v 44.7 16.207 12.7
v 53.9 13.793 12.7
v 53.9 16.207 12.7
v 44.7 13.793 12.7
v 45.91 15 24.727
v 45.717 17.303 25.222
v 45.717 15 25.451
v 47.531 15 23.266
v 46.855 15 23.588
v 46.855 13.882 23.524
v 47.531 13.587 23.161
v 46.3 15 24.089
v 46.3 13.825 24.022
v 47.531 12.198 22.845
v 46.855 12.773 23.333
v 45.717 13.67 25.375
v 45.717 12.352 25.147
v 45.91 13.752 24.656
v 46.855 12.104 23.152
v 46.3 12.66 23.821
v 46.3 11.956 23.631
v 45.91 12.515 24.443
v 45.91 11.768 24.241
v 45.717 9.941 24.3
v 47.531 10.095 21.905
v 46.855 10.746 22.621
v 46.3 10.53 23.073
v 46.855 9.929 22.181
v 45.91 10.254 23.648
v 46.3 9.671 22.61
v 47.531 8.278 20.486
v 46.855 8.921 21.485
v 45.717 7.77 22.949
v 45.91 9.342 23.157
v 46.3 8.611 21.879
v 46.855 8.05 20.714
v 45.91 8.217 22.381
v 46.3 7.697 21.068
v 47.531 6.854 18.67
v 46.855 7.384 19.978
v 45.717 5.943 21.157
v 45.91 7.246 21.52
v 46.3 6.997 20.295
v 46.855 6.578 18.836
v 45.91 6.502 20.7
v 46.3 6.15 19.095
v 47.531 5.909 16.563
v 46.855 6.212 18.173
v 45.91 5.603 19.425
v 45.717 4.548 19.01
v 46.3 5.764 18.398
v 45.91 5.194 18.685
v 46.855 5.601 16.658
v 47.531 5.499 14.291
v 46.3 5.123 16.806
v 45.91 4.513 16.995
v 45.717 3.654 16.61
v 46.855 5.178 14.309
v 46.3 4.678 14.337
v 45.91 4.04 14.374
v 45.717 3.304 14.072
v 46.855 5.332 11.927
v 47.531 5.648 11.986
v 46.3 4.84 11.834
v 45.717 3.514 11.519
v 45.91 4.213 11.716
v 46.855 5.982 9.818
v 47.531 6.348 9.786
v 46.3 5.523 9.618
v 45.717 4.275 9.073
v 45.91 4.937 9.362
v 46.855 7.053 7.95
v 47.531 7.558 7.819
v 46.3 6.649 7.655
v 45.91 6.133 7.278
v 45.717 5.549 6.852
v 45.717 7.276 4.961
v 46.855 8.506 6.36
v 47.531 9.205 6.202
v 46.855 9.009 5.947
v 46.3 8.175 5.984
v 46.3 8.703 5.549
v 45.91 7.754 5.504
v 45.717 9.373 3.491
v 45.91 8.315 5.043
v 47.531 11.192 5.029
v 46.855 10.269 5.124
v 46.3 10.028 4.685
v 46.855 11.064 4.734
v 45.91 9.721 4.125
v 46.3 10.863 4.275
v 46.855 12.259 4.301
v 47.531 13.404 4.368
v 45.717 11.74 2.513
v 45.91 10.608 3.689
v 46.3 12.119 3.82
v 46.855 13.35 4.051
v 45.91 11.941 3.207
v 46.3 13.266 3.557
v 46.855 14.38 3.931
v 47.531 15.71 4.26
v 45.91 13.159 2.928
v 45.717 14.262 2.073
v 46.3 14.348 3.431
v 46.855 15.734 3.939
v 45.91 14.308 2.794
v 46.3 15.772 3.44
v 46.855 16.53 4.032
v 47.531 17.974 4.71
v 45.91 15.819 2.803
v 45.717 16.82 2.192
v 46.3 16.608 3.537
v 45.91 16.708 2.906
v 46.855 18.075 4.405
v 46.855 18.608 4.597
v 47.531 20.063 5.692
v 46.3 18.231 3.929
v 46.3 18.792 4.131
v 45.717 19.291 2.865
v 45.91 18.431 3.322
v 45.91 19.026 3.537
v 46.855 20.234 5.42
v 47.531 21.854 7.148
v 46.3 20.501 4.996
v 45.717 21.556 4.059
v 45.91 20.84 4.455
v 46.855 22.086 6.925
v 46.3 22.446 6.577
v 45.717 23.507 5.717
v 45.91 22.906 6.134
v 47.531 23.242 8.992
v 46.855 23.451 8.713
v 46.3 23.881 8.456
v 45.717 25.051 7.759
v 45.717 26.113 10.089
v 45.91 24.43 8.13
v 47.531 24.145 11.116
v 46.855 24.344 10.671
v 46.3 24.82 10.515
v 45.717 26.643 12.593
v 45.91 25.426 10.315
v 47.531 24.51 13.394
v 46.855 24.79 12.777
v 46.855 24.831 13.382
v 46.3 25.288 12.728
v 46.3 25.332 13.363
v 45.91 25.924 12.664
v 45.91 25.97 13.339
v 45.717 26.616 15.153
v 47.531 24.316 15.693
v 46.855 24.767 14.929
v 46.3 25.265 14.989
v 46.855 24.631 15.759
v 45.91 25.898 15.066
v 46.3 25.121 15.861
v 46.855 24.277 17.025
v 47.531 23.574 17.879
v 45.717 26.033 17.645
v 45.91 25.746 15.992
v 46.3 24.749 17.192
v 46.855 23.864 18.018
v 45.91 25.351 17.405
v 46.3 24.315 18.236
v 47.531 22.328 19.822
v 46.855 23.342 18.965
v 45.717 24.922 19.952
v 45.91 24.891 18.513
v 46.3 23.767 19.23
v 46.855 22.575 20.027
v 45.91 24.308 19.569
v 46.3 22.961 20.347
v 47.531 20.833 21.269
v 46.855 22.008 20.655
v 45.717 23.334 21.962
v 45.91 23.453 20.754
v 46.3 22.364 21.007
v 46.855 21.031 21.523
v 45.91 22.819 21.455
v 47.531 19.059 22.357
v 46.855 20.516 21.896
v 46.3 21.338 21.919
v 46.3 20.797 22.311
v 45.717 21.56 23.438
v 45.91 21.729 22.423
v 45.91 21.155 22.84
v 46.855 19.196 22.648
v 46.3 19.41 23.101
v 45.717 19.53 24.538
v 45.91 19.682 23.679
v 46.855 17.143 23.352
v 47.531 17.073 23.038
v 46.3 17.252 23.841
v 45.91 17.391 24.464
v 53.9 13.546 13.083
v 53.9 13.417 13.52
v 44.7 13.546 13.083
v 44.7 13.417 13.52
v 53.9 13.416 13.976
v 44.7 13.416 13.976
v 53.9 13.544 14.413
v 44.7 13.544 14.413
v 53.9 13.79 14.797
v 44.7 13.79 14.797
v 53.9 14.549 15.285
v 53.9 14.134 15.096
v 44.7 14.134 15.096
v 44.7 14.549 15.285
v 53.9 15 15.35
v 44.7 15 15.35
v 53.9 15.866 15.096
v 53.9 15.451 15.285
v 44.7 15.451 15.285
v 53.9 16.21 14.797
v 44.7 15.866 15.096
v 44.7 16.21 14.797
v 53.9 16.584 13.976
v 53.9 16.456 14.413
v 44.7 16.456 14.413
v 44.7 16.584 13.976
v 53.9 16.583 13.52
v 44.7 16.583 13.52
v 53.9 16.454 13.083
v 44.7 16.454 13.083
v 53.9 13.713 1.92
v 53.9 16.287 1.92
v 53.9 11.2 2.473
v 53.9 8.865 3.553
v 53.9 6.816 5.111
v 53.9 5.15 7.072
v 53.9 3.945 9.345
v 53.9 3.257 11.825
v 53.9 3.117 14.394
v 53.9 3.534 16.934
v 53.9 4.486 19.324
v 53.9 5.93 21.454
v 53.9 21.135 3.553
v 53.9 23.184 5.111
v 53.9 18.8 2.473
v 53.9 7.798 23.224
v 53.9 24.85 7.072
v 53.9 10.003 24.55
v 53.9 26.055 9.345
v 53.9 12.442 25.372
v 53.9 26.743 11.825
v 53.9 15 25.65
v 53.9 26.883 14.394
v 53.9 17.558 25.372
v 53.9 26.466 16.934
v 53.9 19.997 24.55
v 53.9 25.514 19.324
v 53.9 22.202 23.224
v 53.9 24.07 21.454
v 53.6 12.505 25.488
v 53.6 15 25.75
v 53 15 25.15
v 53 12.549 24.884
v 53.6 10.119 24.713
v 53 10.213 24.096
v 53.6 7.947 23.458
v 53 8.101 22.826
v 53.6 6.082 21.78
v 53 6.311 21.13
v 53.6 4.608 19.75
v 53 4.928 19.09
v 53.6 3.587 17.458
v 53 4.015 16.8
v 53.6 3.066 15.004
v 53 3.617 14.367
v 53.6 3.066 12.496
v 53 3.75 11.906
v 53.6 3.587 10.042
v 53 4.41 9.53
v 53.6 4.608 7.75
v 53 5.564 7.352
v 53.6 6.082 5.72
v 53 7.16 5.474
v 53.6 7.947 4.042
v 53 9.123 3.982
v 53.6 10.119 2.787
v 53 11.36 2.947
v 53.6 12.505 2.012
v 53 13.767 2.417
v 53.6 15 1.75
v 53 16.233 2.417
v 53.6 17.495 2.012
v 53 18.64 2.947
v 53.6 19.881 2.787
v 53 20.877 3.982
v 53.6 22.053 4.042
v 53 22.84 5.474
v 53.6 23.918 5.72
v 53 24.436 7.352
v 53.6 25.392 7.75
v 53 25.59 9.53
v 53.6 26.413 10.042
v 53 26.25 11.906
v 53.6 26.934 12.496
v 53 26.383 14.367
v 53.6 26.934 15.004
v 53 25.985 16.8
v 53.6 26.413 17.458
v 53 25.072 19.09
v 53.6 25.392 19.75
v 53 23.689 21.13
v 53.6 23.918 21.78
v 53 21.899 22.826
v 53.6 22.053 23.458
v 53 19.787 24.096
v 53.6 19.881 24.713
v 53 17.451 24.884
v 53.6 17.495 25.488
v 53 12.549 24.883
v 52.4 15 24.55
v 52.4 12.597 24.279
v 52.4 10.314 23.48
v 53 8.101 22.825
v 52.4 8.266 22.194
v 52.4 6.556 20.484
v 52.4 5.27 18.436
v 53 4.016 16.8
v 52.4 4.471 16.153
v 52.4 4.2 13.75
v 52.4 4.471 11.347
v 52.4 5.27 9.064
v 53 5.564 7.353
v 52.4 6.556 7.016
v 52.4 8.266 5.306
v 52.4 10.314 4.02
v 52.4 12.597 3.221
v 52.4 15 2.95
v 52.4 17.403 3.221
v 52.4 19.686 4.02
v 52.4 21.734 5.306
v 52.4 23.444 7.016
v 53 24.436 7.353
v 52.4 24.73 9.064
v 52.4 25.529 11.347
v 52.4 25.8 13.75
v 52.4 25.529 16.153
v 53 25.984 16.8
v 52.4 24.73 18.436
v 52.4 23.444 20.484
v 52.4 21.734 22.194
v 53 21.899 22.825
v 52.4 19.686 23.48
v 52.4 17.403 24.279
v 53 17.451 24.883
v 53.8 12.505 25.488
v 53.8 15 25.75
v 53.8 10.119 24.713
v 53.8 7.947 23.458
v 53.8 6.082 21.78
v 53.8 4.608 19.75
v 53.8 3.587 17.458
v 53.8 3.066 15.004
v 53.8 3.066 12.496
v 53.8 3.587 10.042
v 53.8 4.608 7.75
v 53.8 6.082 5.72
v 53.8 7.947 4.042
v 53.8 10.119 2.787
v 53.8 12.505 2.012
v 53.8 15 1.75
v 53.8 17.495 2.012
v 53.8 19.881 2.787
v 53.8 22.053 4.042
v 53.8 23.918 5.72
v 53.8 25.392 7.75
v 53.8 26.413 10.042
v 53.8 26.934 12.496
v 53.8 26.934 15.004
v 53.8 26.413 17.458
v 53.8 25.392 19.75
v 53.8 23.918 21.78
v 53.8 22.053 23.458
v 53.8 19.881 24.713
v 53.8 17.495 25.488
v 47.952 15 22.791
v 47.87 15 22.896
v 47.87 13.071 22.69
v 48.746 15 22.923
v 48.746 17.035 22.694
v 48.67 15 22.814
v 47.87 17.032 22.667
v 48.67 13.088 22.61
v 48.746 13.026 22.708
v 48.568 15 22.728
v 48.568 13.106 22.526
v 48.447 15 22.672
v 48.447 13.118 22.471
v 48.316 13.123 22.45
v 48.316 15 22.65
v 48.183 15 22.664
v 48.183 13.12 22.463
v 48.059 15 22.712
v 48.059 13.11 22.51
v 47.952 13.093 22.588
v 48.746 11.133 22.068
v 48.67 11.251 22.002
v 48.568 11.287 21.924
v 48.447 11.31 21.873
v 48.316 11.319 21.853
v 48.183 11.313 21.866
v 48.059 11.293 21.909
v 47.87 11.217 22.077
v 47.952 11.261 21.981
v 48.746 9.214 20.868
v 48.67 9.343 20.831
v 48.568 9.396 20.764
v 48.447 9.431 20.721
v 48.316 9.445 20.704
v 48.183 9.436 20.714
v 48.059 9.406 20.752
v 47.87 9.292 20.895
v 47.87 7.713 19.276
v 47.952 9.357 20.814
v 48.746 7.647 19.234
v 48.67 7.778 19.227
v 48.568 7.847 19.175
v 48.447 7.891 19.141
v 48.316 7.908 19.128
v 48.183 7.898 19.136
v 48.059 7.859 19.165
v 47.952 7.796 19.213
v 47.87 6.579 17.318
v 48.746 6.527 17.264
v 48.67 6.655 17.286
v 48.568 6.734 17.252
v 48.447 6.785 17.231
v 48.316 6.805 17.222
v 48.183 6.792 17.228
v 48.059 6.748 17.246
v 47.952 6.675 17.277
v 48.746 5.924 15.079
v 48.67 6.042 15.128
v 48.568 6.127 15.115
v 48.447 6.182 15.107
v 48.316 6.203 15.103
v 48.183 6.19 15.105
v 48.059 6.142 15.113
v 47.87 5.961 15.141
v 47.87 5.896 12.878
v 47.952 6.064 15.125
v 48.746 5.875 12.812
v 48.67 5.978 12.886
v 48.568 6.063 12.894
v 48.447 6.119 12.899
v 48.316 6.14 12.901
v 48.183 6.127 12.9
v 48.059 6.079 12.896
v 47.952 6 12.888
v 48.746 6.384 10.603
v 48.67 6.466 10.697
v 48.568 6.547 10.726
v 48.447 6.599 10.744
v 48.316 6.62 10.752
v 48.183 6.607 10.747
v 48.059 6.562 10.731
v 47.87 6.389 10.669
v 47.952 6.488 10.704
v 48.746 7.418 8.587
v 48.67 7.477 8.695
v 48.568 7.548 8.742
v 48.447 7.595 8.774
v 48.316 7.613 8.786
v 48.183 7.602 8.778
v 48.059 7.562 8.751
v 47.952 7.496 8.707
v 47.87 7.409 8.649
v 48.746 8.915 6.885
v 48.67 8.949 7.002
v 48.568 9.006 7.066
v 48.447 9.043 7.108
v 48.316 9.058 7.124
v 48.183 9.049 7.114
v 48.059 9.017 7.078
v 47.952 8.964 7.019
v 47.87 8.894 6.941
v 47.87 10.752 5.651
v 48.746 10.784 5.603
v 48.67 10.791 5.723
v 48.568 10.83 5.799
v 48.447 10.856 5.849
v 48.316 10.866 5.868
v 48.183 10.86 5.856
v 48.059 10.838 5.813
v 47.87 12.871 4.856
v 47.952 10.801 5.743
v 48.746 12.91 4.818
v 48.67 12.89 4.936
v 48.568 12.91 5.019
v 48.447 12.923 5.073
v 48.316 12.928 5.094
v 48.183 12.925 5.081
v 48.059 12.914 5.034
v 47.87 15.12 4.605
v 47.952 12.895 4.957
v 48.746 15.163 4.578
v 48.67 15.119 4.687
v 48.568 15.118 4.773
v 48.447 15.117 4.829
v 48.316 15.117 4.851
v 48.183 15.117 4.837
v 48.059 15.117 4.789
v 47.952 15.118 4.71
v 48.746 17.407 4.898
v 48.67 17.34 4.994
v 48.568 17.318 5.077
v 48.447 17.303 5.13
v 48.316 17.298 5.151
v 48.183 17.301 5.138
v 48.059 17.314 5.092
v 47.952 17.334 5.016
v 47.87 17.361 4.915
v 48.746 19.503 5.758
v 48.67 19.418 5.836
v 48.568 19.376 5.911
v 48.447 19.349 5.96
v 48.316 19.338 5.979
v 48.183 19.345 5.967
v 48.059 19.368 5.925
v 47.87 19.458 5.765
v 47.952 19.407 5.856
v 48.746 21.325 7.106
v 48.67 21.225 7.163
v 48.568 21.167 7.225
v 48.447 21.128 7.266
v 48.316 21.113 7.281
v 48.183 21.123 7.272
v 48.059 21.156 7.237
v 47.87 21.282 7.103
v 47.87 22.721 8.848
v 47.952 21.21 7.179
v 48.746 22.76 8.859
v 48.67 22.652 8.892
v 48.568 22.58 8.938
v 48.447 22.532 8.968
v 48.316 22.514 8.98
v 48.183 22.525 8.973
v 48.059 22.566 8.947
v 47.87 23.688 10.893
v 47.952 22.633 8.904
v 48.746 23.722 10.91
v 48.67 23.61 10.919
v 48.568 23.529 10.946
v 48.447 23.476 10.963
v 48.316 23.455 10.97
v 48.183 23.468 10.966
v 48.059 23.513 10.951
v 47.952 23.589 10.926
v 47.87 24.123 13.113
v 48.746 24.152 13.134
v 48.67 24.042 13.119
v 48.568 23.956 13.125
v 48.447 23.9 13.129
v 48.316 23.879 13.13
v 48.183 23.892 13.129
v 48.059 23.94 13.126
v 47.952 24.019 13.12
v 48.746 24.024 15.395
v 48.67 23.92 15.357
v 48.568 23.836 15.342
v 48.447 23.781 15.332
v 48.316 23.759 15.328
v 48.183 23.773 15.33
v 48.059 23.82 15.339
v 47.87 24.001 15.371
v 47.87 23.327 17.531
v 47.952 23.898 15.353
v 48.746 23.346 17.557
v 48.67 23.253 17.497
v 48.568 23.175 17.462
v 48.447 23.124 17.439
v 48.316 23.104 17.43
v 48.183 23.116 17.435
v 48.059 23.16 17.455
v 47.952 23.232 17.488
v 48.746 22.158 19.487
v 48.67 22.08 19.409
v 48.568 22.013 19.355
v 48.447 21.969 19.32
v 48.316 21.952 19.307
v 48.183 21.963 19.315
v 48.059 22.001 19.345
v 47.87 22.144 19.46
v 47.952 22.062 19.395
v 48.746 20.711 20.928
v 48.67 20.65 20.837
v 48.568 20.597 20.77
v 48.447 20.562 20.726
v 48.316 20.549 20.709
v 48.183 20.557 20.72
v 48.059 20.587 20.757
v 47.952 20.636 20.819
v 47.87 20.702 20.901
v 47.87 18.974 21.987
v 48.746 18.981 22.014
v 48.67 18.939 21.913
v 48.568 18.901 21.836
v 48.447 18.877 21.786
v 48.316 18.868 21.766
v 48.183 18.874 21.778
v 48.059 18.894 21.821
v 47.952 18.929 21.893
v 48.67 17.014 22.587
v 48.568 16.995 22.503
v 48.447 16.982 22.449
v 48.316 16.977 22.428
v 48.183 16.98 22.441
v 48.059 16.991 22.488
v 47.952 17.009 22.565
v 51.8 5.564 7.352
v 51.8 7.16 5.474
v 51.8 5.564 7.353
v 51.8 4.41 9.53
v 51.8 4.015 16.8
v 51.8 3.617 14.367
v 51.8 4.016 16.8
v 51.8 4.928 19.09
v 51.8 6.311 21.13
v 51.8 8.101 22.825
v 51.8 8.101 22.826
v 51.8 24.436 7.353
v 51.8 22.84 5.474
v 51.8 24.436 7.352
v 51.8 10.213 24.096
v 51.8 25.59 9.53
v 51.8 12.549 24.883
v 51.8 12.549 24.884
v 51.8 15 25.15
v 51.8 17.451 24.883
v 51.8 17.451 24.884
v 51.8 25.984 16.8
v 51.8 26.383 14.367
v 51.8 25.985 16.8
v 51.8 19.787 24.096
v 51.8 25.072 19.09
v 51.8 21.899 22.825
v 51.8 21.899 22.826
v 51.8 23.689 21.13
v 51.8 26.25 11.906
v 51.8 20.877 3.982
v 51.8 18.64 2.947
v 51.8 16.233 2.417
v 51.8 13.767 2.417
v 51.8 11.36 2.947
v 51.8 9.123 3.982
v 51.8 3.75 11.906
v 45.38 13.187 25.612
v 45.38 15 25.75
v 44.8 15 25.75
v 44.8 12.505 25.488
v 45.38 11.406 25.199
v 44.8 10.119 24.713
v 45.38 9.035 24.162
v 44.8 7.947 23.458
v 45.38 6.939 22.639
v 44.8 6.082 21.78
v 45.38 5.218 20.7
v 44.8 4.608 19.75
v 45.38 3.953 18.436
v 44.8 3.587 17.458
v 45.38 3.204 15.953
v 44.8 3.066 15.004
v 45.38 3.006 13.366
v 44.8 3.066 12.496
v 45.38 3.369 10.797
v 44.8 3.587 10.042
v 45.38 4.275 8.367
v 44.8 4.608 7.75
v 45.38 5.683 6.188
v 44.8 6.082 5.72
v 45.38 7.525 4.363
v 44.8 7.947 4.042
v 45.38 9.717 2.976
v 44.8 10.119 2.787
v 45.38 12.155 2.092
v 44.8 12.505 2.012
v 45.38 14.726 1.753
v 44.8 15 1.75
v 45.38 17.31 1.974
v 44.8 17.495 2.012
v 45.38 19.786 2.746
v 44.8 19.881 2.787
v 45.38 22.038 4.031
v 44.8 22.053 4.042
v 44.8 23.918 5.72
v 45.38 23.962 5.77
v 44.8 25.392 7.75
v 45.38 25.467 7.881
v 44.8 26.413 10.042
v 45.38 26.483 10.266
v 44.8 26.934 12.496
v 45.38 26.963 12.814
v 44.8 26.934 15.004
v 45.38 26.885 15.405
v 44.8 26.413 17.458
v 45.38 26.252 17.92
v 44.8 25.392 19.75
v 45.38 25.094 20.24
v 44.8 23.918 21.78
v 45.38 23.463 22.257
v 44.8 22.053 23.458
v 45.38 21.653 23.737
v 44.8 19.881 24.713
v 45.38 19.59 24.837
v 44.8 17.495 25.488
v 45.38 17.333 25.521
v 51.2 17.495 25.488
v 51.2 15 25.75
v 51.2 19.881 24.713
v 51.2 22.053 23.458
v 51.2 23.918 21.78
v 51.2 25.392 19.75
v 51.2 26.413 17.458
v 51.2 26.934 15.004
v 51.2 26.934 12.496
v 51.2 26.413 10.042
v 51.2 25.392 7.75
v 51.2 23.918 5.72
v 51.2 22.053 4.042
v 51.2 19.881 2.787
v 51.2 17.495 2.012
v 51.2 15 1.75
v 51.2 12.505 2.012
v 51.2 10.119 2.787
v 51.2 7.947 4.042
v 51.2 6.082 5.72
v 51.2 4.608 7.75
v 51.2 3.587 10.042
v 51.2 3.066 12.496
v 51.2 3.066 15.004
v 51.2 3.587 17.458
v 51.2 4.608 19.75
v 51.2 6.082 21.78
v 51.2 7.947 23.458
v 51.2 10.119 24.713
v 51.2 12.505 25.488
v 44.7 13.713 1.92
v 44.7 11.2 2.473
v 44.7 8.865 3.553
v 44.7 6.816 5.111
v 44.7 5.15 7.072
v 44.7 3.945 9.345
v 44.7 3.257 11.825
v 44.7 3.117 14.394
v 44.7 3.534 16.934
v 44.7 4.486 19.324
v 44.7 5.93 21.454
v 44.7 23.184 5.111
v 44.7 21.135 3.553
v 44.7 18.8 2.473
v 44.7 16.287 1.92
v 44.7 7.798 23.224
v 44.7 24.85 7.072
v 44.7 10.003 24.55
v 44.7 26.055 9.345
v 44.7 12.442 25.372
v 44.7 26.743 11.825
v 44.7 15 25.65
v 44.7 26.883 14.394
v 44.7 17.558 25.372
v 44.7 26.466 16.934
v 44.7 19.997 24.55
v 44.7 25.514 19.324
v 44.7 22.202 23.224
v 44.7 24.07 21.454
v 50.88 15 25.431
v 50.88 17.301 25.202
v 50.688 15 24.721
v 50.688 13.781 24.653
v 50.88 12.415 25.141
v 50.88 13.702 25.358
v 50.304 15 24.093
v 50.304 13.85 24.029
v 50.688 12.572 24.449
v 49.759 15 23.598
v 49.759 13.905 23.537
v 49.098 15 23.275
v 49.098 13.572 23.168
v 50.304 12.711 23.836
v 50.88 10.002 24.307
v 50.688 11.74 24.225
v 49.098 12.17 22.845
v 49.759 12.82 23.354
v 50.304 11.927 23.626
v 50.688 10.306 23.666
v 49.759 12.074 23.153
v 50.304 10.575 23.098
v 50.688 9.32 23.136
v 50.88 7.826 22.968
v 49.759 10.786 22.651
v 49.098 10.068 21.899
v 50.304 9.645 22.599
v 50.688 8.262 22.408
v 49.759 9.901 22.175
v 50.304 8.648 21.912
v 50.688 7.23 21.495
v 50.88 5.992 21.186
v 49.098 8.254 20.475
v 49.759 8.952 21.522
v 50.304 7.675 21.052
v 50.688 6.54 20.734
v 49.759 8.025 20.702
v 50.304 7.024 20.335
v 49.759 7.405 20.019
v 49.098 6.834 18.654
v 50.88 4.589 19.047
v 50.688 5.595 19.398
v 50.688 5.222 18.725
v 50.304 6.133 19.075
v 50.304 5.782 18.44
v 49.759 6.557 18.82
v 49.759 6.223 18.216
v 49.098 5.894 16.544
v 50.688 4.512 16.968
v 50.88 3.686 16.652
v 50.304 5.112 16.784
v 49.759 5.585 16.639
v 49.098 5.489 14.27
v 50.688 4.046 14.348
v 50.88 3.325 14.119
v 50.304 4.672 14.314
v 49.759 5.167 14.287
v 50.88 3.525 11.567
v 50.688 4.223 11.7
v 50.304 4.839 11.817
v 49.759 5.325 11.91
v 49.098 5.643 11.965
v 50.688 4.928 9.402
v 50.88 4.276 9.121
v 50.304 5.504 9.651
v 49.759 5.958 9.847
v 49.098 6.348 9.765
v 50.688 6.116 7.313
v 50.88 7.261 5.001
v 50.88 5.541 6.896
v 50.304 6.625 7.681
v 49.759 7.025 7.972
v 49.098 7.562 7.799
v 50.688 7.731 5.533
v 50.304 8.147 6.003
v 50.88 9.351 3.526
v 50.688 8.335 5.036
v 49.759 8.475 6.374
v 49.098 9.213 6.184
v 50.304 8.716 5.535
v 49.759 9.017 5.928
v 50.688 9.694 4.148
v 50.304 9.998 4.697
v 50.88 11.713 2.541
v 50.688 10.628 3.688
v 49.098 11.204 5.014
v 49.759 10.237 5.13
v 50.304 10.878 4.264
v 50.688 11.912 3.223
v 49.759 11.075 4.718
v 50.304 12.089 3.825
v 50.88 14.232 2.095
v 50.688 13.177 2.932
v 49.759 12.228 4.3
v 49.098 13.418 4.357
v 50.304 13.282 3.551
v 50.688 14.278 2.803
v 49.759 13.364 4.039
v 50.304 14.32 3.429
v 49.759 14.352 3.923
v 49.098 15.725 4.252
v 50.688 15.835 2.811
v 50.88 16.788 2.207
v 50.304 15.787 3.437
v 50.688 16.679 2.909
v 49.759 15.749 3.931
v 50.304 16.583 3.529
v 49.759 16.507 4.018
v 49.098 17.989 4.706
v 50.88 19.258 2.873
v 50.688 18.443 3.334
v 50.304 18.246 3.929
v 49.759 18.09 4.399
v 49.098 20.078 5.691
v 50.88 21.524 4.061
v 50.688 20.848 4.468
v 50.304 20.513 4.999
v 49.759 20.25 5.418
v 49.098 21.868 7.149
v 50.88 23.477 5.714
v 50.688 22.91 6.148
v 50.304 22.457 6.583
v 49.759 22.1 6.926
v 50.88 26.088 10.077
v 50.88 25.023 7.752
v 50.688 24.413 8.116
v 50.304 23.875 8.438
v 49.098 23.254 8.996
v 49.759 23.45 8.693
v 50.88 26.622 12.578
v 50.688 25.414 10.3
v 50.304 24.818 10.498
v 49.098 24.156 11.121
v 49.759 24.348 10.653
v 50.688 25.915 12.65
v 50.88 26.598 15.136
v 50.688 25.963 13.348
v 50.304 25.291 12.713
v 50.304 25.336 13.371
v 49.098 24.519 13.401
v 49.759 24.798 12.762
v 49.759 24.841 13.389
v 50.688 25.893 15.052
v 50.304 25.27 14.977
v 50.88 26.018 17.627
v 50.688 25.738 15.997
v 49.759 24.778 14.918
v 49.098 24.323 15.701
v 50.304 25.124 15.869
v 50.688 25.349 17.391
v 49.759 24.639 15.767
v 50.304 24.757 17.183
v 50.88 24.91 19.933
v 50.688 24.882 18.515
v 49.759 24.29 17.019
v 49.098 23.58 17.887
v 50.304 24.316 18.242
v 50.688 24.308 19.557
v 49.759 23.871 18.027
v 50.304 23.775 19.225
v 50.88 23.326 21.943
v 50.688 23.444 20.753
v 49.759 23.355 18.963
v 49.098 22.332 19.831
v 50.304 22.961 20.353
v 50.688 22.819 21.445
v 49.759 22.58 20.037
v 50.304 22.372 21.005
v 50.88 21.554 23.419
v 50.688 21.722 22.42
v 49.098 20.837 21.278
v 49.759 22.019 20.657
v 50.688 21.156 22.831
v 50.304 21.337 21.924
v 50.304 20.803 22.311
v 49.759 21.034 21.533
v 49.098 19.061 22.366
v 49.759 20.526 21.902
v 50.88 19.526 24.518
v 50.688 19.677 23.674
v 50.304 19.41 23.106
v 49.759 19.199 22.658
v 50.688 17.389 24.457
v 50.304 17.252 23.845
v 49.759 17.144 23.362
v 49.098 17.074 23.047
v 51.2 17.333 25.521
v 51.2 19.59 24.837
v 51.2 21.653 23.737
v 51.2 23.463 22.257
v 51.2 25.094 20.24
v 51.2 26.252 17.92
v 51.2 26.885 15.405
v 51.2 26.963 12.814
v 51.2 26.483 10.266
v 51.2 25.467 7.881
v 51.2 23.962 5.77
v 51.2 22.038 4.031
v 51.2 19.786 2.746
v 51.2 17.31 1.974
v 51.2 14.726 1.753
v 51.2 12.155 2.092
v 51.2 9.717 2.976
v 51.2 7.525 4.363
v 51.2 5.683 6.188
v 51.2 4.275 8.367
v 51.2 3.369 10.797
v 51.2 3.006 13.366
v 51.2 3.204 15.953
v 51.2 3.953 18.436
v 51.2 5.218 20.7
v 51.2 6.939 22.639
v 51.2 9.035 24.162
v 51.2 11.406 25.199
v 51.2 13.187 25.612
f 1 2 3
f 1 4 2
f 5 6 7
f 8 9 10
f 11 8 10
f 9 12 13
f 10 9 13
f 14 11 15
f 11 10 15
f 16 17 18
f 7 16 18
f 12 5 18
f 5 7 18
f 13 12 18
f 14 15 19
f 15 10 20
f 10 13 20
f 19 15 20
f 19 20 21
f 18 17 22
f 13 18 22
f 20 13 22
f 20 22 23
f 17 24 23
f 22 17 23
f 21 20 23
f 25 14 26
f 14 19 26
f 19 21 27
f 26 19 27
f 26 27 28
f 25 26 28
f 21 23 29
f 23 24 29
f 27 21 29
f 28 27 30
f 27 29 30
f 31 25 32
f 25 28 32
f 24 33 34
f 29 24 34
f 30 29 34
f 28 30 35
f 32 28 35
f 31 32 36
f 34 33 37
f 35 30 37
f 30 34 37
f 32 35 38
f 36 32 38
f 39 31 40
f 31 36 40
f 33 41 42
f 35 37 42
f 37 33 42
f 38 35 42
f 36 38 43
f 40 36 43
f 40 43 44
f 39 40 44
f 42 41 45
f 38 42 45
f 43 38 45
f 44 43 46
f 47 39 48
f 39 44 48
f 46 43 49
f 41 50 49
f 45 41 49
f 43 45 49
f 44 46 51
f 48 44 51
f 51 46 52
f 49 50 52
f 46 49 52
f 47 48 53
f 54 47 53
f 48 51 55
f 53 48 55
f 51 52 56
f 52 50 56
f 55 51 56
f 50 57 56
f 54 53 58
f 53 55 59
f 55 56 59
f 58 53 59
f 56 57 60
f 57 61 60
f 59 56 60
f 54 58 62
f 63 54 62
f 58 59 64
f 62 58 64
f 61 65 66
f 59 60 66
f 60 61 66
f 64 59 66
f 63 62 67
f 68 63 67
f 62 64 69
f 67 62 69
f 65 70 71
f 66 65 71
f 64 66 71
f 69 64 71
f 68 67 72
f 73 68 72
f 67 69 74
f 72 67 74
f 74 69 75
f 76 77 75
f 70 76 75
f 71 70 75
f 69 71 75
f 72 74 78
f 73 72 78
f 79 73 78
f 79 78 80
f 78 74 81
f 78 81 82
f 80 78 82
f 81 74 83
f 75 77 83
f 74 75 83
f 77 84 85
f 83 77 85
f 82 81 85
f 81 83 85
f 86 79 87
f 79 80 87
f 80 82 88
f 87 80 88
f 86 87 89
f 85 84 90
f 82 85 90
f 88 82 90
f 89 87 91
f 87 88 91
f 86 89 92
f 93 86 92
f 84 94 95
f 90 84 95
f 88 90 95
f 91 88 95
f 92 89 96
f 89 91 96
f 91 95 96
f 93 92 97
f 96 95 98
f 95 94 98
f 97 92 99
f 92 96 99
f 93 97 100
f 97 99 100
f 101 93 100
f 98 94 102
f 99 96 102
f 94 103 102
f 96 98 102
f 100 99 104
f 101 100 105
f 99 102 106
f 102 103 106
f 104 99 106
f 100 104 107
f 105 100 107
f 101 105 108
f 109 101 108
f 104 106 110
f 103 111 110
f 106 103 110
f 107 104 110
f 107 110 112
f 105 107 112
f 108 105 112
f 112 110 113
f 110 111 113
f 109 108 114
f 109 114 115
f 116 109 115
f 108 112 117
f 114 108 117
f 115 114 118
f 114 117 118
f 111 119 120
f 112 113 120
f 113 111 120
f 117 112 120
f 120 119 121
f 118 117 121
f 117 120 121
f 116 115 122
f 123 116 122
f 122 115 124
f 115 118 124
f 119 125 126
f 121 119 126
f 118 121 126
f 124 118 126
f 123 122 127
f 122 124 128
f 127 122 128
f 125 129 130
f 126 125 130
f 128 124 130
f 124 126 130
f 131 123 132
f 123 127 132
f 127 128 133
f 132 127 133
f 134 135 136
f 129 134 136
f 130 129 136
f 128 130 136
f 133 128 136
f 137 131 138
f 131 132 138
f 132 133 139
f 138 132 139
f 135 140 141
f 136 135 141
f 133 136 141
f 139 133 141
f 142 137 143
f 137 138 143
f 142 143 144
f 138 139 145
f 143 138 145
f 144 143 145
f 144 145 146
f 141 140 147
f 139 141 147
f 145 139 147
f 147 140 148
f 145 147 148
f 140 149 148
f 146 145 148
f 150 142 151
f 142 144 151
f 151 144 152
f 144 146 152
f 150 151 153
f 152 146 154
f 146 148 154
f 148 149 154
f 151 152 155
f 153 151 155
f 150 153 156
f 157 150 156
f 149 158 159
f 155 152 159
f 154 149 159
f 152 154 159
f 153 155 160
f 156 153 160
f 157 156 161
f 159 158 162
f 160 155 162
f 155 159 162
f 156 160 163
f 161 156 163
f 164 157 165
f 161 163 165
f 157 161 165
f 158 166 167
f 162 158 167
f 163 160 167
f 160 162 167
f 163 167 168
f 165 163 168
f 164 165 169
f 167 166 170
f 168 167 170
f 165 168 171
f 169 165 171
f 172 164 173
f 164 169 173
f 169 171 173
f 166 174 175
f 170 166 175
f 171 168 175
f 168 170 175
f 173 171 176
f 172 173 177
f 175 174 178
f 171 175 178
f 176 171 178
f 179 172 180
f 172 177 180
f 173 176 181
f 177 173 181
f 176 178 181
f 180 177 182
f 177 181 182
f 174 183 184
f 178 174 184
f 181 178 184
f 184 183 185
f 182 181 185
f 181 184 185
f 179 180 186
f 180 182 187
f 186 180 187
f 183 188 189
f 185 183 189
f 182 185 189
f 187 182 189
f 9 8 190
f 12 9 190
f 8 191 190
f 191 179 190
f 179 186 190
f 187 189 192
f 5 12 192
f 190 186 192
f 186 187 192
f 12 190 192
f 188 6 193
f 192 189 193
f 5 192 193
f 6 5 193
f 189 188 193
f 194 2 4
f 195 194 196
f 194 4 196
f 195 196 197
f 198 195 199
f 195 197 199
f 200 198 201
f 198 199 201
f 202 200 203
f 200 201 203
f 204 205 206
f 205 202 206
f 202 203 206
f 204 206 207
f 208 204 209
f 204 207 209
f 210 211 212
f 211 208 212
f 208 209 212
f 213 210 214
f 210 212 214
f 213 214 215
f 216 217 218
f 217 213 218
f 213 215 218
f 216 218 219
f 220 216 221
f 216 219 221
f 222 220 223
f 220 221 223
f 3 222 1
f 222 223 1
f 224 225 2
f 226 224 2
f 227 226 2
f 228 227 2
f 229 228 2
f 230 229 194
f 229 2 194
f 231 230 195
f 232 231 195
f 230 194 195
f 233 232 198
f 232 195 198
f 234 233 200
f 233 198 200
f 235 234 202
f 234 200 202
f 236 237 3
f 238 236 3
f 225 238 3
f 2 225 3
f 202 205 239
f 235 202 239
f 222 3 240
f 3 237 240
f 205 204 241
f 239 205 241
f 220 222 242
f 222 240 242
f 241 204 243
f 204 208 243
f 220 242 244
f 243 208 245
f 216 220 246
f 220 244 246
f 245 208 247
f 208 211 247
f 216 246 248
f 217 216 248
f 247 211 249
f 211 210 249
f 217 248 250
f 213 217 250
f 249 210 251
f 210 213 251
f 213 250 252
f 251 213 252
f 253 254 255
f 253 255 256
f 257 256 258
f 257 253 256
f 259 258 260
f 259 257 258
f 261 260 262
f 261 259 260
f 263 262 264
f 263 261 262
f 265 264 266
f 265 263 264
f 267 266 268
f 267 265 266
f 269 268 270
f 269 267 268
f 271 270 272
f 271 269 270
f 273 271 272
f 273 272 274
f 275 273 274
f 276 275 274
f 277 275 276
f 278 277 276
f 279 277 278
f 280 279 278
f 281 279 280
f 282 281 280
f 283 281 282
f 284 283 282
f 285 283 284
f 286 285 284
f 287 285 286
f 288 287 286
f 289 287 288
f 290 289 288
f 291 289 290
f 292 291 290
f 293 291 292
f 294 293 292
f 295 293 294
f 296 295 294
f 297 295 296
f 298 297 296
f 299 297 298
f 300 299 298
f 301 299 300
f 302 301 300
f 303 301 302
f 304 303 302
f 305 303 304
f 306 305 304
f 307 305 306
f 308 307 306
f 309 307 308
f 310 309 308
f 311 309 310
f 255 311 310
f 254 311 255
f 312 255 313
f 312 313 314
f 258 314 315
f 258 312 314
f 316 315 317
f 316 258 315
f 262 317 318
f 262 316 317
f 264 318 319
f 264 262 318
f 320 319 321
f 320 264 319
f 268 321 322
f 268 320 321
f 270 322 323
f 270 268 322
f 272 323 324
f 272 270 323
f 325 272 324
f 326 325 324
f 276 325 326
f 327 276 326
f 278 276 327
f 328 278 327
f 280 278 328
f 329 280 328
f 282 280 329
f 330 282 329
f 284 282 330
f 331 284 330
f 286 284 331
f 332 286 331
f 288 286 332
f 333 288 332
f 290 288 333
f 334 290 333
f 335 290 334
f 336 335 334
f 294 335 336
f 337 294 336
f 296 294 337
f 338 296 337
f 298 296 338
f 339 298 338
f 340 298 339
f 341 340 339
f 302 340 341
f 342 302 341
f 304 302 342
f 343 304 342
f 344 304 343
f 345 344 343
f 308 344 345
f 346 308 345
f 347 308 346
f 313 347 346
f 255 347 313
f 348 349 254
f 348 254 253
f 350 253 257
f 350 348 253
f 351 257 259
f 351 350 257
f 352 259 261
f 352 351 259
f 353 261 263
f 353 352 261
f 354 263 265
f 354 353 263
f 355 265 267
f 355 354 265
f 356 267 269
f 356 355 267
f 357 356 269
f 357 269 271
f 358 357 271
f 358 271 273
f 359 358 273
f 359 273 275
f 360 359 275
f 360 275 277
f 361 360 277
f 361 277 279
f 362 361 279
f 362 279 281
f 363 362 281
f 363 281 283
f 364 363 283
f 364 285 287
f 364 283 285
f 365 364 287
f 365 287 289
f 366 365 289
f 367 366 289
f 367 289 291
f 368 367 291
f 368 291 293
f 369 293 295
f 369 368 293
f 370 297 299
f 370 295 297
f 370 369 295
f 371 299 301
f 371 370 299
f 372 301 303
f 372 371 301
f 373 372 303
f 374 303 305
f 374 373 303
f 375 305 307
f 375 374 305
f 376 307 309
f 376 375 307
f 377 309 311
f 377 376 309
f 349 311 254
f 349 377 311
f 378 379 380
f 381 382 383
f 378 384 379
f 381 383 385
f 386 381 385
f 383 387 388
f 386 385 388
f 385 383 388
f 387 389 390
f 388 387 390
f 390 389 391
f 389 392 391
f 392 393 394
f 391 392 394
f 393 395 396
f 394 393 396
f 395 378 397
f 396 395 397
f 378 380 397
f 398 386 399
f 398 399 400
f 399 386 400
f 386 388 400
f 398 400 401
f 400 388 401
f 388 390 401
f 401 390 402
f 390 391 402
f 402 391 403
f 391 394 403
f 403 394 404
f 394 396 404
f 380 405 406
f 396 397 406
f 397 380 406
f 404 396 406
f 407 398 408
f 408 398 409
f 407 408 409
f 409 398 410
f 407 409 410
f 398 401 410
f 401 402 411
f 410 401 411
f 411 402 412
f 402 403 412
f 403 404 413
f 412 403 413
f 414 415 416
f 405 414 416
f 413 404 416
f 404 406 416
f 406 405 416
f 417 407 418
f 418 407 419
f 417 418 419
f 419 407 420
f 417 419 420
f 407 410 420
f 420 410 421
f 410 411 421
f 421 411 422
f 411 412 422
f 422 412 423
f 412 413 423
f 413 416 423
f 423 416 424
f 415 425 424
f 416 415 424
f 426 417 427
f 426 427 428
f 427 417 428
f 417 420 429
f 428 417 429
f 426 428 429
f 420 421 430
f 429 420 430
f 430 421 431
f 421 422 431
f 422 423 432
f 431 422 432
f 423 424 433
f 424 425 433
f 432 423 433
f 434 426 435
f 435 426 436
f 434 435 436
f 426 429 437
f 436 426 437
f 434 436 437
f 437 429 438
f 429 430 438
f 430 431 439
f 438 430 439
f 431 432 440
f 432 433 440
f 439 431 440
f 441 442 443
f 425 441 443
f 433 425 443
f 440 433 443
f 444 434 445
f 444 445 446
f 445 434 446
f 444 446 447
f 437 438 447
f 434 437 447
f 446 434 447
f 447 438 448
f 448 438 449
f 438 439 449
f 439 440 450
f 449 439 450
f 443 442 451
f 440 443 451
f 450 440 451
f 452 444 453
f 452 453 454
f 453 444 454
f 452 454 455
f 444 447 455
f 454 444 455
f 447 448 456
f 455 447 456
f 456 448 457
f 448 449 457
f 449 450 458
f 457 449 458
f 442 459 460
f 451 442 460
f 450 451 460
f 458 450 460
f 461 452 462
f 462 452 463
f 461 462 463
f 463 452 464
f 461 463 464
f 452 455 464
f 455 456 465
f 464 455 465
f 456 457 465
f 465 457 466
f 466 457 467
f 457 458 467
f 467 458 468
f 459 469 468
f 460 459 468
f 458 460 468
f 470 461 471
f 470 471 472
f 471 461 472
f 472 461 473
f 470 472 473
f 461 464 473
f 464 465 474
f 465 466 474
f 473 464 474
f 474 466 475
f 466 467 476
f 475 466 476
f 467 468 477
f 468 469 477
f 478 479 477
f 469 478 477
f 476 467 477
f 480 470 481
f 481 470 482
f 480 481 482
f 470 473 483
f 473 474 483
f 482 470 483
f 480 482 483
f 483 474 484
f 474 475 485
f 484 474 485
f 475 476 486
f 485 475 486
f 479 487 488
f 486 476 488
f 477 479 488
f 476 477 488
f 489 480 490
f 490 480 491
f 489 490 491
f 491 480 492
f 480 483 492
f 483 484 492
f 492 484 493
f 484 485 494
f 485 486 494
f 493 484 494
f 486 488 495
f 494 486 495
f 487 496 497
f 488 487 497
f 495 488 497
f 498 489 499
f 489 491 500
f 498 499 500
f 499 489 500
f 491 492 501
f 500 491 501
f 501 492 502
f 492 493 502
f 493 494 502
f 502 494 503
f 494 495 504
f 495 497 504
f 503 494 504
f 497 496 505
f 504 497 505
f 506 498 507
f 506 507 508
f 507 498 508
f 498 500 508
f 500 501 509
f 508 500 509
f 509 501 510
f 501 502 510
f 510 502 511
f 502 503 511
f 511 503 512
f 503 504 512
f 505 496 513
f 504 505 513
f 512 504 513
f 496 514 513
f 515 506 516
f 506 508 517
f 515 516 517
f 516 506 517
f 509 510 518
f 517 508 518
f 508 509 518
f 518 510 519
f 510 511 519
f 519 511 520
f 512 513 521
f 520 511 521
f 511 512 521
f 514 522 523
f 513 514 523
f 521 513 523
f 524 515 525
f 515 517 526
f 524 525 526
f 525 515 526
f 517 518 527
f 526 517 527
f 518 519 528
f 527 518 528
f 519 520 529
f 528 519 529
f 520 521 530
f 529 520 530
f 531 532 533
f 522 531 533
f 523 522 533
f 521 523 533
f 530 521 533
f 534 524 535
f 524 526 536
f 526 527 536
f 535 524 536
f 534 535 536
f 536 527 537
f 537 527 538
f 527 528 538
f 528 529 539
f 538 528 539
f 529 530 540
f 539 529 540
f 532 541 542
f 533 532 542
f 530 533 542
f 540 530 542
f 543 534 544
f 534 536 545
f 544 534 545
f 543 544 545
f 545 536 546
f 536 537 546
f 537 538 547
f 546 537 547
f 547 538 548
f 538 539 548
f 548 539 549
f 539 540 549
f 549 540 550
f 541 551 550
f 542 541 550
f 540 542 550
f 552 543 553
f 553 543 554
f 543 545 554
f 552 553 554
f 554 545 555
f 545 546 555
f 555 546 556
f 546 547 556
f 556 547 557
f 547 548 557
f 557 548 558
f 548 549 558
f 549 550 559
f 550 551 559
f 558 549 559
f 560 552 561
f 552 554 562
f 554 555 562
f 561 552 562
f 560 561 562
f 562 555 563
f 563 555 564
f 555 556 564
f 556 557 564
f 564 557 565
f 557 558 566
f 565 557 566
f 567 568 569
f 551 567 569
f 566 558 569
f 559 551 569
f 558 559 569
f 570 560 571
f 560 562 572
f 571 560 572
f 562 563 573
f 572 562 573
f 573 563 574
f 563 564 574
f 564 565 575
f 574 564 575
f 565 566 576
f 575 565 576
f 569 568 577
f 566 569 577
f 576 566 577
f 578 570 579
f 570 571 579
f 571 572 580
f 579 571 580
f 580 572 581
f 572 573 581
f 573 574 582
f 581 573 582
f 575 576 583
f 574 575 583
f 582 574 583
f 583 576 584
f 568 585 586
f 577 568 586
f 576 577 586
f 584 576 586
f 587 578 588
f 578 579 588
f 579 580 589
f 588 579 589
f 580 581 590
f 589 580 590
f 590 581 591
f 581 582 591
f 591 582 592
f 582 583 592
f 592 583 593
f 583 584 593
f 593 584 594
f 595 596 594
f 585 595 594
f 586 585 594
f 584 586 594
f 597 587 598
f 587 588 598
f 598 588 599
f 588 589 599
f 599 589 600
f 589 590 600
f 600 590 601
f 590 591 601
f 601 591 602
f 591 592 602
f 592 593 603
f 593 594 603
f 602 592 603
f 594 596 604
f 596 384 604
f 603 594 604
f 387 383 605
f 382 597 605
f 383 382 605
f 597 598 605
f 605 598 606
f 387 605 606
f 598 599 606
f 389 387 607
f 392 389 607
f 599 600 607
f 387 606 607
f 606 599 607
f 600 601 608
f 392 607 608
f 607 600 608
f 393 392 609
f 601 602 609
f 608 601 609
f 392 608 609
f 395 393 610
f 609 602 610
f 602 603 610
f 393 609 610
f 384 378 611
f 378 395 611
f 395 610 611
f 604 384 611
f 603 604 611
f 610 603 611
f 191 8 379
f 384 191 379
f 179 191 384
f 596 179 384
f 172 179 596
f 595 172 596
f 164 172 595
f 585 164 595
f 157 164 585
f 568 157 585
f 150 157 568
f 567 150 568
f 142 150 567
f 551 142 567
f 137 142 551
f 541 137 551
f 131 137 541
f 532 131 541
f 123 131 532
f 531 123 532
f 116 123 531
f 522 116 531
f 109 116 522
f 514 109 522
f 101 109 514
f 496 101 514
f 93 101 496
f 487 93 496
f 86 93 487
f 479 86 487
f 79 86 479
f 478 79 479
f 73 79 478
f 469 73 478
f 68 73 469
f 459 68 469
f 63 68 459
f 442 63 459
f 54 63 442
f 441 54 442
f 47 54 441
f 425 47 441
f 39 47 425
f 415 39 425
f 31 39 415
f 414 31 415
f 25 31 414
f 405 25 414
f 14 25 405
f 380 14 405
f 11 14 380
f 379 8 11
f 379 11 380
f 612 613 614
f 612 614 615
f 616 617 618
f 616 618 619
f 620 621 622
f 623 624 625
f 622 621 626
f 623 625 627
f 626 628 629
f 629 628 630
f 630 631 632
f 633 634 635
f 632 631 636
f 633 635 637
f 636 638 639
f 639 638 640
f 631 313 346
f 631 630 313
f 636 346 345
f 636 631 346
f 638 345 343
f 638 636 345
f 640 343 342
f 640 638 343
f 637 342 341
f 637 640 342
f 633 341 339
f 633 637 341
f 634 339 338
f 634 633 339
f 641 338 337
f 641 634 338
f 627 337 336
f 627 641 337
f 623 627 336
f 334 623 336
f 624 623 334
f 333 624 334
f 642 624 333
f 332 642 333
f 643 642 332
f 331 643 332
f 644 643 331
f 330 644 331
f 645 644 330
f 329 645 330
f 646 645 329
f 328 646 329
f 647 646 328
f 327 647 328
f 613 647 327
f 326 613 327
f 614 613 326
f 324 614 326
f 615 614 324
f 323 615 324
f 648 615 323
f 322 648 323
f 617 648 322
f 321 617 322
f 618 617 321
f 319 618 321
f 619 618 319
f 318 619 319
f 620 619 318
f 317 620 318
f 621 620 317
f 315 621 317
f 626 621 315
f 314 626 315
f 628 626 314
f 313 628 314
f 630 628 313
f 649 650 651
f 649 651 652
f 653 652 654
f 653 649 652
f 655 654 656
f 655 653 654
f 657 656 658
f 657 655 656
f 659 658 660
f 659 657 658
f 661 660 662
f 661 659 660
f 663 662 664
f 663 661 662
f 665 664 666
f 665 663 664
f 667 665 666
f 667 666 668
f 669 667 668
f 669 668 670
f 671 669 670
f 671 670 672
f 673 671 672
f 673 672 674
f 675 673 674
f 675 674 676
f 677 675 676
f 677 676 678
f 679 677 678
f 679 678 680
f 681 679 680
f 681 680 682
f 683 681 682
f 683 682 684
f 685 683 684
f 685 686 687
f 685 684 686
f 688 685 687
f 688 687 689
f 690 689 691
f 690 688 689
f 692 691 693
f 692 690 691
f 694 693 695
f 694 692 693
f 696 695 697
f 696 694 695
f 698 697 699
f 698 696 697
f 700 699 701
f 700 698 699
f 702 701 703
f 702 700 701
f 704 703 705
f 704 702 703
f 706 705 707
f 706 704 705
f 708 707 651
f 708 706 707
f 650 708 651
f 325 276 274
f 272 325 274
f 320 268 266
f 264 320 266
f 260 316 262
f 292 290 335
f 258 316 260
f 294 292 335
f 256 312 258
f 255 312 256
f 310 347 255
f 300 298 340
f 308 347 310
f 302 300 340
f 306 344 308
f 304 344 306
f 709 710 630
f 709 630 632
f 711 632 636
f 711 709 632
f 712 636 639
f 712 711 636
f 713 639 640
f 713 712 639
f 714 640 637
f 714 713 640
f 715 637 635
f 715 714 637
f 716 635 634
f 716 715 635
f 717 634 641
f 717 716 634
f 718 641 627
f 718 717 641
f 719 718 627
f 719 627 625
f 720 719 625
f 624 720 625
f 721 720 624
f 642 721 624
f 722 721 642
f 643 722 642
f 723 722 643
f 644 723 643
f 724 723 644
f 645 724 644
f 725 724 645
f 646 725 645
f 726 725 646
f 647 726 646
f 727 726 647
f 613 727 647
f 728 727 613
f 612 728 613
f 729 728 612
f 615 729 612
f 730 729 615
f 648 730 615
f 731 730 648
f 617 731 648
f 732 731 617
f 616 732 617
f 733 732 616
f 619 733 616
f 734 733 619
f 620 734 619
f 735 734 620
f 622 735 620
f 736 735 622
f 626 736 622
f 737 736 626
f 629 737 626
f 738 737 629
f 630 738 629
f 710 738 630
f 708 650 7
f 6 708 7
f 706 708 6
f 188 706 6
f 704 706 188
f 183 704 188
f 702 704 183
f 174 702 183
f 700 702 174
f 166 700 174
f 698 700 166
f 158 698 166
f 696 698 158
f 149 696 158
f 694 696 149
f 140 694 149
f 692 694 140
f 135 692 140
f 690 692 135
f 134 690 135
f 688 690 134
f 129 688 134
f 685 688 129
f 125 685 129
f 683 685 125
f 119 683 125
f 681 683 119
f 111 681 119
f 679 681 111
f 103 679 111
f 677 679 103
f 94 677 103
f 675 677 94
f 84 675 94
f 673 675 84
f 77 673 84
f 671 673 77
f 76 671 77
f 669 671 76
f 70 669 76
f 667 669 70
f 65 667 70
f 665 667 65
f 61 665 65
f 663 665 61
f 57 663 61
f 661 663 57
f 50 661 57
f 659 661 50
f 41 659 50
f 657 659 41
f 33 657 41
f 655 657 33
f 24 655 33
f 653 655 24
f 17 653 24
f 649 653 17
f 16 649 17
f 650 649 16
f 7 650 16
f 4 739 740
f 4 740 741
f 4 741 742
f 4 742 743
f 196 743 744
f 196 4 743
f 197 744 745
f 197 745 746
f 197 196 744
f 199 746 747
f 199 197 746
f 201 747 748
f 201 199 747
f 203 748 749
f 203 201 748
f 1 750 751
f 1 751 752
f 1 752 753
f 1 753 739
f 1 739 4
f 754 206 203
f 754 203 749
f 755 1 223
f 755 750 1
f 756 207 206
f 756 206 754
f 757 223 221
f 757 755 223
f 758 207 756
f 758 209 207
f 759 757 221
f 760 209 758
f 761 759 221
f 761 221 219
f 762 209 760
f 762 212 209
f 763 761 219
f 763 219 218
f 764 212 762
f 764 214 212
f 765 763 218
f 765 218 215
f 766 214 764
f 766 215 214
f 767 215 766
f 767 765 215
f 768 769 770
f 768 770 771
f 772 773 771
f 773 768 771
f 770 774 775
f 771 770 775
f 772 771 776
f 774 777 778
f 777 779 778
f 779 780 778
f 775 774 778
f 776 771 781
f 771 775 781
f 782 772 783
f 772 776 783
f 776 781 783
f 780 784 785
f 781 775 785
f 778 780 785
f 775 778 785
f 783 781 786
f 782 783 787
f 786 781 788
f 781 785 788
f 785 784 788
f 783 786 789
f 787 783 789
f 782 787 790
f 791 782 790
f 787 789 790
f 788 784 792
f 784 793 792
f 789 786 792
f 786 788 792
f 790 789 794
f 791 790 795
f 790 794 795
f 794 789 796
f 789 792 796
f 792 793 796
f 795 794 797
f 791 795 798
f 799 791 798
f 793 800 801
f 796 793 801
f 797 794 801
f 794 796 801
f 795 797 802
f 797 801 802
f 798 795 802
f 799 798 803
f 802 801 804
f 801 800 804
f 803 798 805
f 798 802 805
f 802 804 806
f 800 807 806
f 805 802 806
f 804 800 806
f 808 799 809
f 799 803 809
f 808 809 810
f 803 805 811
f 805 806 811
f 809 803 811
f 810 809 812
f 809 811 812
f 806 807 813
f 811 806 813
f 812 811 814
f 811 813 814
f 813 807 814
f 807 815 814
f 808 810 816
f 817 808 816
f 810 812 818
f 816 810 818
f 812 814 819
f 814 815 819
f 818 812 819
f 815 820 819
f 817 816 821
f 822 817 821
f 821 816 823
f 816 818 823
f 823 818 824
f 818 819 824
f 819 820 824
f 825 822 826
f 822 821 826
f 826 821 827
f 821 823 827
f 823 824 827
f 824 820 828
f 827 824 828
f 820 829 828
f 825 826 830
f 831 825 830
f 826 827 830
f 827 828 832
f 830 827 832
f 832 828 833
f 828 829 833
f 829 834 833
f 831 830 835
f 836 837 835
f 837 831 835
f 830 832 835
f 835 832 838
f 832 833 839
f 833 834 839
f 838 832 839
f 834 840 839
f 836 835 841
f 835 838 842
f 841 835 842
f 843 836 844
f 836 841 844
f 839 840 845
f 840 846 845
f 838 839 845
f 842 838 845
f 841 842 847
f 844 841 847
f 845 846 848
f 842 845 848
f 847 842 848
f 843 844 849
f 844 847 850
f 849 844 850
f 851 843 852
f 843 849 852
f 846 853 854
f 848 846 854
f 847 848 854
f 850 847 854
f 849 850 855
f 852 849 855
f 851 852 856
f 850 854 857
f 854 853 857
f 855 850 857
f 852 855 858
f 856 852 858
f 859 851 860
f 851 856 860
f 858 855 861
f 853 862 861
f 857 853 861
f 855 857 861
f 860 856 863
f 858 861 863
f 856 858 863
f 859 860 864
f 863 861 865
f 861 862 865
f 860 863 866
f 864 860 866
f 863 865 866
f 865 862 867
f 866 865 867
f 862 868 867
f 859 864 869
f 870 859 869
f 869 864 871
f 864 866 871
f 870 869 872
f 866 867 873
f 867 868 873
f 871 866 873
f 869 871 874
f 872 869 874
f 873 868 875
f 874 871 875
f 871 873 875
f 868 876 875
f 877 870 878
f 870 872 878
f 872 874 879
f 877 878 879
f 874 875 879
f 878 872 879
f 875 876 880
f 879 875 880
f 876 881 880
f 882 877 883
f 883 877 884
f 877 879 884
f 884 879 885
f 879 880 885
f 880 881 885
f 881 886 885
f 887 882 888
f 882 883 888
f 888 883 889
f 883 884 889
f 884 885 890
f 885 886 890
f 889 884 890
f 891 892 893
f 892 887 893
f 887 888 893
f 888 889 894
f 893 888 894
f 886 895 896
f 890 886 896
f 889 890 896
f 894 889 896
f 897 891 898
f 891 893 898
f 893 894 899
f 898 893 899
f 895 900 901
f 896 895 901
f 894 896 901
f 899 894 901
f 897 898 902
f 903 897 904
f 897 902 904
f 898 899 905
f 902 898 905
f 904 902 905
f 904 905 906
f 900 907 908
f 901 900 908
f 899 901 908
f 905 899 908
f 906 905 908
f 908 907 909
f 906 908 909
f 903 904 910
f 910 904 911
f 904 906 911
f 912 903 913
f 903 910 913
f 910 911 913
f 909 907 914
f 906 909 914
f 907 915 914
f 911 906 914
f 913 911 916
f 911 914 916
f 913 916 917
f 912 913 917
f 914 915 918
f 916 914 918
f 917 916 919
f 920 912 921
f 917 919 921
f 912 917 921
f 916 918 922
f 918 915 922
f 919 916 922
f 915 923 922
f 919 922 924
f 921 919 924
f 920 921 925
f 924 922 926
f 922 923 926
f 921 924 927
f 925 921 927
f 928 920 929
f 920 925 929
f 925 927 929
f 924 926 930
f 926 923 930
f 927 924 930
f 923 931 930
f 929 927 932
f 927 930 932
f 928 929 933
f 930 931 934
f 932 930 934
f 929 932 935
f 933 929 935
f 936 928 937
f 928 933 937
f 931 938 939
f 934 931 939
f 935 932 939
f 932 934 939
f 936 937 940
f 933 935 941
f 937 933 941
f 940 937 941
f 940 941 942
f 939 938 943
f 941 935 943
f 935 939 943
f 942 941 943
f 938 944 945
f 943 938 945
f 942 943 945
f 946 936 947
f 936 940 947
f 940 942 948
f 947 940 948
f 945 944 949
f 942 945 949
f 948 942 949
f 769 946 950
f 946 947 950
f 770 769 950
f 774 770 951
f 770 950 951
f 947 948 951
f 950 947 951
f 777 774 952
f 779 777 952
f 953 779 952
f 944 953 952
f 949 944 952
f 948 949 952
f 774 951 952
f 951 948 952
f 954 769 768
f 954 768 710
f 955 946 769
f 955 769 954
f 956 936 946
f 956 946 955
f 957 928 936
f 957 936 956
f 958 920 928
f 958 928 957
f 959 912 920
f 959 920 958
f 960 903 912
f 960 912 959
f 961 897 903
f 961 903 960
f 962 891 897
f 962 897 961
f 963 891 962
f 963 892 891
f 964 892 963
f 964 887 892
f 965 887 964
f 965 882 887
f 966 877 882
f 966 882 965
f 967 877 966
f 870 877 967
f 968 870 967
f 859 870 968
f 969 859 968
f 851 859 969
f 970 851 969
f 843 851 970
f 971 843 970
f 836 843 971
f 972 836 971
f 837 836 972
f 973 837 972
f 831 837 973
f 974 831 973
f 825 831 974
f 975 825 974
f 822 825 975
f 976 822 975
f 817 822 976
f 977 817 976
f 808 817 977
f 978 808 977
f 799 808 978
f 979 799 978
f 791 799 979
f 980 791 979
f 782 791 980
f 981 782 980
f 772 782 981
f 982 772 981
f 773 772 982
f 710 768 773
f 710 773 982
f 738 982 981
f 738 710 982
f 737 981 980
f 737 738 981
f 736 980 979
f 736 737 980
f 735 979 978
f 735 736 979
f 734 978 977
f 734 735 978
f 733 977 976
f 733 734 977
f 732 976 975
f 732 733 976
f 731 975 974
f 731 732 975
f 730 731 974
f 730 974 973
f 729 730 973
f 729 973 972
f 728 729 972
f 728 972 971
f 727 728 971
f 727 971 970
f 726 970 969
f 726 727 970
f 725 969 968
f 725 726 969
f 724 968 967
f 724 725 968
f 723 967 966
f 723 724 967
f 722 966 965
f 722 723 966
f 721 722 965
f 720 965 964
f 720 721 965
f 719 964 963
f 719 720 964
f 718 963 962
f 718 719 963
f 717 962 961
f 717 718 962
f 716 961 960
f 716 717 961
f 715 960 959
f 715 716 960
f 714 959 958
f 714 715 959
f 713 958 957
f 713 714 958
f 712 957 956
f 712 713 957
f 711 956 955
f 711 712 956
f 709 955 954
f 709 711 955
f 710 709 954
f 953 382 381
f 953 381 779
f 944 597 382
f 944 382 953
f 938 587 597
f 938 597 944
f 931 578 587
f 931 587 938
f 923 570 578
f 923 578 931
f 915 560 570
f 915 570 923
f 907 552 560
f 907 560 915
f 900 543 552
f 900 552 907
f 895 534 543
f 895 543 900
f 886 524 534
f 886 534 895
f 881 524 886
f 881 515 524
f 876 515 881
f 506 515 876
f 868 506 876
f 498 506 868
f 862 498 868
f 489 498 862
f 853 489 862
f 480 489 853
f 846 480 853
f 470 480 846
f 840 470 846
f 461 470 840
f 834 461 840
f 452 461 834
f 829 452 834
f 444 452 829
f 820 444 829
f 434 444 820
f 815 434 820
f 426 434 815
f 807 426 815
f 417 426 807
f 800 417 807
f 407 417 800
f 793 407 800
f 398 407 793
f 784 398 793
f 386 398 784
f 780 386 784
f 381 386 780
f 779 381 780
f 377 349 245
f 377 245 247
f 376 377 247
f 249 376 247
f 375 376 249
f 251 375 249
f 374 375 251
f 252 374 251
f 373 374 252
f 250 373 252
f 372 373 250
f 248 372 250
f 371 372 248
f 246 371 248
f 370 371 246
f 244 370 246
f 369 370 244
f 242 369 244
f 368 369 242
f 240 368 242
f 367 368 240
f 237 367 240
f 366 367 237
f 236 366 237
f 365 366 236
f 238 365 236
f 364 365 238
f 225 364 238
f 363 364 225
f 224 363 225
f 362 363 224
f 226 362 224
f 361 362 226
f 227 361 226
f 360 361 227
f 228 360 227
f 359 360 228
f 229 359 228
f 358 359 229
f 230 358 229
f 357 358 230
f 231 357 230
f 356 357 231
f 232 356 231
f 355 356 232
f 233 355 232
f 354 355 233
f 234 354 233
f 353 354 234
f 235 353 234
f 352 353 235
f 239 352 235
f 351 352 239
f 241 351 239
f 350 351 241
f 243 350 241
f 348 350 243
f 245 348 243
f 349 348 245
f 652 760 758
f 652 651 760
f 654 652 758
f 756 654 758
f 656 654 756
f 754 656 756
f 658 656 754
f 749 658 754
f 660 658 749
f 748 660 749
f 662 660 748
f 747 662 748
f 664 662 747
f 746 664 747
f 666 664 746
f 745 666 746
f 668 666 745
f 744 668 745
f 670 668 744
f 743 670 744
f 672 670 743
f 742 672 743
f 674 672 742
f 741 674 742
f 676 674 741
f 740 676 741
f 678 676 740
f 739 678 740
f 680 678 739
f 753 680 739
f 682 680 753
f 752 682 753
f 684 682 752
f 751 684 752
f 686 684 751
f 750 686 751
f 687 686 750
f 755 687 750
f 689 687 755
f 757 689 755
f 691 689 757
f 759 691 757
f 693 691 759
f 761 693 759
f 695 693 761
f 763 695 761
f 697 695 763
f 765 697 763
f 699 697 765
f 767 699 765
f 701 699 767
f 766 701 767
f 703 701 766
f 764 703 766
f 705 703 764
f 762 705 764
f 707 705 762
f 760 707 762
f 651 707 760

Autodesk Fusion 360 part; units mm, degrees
sketch "Sketch1" plane through (0, 0, 0) normal (1, 0, 0) x (0, 1, 0) in component "Wheel v0"
  line L0 (0, 0) -> (9.2, 0)
  line L1 (9.2, 0) -> (9.2, 12)
  line L2 (9.2, 12) -> (0, 12)
  line L3 (0, 12) -> (0, 0)
  line L4 (0, 10.3) -> (9.2, 10.3)
  line L5 (7.1, 0) -> (8.3, 0)
  line L6 (8.3, 0) -> (8.3, 1.2)
  line L7 (8.3, 1.2) -> (7.1, 1.2)
  line L8 (7.1, 1.2) -> (7.1, 0)
  circle A0 centre (3.6, 0) radius 2.6
  line L9 (3.6, 0) -> (3.6, 2.6) construction
  circle A1 centre (3.6, 2.6) radius 0.5
  dimension "d1" = 9.2
  dimension "d2" = 12
  dimension "d3" = 1.7
  dimension "d4" = 1.2
  dimension "d5" = 1.2
  dimension "d6" = 7.1
  dimension "d7" = 5.2
  dimension "d8" = 3.6
  dimension "d9" = 1
revolve "Revolve1" add sketch "Sketch1" angle 360 about axis through (0, 9.2, 12) along (0, -1, 0) contours L0 L1 L3 L4 L6 L7 L8 A0 A1 | L1 L2 L3 L4 in component "Wheel v0"
chamfer "Chamfer1" distance 0.6 angle 45 2 faces at (-0.5962, 7.1, 0.4447) (-1.1327, 8.3, 0.4849) in component "Wheel v0"
chamfer "Chamfer1" distance 0.1 angle 45 2 edges at (-11.1879, 9.2, 7.6606) (-11.1879, 0, 7.6606) in component "Wheel v0"
chamfer "Chamfer1" distance 0.28 distance2 0.31 2 edges at (-8.8087, 4.0977, 8.5834) (-8.8087, 3.1023, 8.5834) measured on face at (-3.6679, 4.0982, 20.7013) measured on face at (7.1736, 1.0027, 21.4704) in component "Wheel v0"
chamfer "Chamfer1" distance 0.32 distance2 0.3 2 edges at (-11.1879, 6.2, 7.6606) (-11.1879, 1, 7.6606) measured on face at (-1.1829, 6.1973, 23.8216) measured on face at (-0.5982, 0.3333, 0.0149) in component "Wheel v0"
sketch "Sketch2" plane through (0, 0, 0) normal (0, -1, 0) x (1, 0, 0) in component "Wheel v0"
  circle A0 centre (0, 12) radius 11.9
  circle A1 centre (0, 12) radius 1.6
  line L0 (-1.2072, 13.0501) -> (1.2072, 13.0501)
  line L1 (0.0188, 10.4001) -> (0, 0) construction
  circle A2 centre (0, 12) radius 1.4
  dimension "d17" = 3.2
  dimension "d18" = 2.65
  dimension "d19" = 2.8
extrude "Extrude6" cut sketch "Sketch2" against normal blind 9.2 contours A1 L0 A2 | L0 A2 picked at (-1.2089, 12.9375) picked at (0.4769, 11.4652) in component "Wheel v0"
component "Wheel v0" placed x (0, 1, 0) y (1, 0, 0) z (0, 0, -1) at (44.7, 15, 25.75)
